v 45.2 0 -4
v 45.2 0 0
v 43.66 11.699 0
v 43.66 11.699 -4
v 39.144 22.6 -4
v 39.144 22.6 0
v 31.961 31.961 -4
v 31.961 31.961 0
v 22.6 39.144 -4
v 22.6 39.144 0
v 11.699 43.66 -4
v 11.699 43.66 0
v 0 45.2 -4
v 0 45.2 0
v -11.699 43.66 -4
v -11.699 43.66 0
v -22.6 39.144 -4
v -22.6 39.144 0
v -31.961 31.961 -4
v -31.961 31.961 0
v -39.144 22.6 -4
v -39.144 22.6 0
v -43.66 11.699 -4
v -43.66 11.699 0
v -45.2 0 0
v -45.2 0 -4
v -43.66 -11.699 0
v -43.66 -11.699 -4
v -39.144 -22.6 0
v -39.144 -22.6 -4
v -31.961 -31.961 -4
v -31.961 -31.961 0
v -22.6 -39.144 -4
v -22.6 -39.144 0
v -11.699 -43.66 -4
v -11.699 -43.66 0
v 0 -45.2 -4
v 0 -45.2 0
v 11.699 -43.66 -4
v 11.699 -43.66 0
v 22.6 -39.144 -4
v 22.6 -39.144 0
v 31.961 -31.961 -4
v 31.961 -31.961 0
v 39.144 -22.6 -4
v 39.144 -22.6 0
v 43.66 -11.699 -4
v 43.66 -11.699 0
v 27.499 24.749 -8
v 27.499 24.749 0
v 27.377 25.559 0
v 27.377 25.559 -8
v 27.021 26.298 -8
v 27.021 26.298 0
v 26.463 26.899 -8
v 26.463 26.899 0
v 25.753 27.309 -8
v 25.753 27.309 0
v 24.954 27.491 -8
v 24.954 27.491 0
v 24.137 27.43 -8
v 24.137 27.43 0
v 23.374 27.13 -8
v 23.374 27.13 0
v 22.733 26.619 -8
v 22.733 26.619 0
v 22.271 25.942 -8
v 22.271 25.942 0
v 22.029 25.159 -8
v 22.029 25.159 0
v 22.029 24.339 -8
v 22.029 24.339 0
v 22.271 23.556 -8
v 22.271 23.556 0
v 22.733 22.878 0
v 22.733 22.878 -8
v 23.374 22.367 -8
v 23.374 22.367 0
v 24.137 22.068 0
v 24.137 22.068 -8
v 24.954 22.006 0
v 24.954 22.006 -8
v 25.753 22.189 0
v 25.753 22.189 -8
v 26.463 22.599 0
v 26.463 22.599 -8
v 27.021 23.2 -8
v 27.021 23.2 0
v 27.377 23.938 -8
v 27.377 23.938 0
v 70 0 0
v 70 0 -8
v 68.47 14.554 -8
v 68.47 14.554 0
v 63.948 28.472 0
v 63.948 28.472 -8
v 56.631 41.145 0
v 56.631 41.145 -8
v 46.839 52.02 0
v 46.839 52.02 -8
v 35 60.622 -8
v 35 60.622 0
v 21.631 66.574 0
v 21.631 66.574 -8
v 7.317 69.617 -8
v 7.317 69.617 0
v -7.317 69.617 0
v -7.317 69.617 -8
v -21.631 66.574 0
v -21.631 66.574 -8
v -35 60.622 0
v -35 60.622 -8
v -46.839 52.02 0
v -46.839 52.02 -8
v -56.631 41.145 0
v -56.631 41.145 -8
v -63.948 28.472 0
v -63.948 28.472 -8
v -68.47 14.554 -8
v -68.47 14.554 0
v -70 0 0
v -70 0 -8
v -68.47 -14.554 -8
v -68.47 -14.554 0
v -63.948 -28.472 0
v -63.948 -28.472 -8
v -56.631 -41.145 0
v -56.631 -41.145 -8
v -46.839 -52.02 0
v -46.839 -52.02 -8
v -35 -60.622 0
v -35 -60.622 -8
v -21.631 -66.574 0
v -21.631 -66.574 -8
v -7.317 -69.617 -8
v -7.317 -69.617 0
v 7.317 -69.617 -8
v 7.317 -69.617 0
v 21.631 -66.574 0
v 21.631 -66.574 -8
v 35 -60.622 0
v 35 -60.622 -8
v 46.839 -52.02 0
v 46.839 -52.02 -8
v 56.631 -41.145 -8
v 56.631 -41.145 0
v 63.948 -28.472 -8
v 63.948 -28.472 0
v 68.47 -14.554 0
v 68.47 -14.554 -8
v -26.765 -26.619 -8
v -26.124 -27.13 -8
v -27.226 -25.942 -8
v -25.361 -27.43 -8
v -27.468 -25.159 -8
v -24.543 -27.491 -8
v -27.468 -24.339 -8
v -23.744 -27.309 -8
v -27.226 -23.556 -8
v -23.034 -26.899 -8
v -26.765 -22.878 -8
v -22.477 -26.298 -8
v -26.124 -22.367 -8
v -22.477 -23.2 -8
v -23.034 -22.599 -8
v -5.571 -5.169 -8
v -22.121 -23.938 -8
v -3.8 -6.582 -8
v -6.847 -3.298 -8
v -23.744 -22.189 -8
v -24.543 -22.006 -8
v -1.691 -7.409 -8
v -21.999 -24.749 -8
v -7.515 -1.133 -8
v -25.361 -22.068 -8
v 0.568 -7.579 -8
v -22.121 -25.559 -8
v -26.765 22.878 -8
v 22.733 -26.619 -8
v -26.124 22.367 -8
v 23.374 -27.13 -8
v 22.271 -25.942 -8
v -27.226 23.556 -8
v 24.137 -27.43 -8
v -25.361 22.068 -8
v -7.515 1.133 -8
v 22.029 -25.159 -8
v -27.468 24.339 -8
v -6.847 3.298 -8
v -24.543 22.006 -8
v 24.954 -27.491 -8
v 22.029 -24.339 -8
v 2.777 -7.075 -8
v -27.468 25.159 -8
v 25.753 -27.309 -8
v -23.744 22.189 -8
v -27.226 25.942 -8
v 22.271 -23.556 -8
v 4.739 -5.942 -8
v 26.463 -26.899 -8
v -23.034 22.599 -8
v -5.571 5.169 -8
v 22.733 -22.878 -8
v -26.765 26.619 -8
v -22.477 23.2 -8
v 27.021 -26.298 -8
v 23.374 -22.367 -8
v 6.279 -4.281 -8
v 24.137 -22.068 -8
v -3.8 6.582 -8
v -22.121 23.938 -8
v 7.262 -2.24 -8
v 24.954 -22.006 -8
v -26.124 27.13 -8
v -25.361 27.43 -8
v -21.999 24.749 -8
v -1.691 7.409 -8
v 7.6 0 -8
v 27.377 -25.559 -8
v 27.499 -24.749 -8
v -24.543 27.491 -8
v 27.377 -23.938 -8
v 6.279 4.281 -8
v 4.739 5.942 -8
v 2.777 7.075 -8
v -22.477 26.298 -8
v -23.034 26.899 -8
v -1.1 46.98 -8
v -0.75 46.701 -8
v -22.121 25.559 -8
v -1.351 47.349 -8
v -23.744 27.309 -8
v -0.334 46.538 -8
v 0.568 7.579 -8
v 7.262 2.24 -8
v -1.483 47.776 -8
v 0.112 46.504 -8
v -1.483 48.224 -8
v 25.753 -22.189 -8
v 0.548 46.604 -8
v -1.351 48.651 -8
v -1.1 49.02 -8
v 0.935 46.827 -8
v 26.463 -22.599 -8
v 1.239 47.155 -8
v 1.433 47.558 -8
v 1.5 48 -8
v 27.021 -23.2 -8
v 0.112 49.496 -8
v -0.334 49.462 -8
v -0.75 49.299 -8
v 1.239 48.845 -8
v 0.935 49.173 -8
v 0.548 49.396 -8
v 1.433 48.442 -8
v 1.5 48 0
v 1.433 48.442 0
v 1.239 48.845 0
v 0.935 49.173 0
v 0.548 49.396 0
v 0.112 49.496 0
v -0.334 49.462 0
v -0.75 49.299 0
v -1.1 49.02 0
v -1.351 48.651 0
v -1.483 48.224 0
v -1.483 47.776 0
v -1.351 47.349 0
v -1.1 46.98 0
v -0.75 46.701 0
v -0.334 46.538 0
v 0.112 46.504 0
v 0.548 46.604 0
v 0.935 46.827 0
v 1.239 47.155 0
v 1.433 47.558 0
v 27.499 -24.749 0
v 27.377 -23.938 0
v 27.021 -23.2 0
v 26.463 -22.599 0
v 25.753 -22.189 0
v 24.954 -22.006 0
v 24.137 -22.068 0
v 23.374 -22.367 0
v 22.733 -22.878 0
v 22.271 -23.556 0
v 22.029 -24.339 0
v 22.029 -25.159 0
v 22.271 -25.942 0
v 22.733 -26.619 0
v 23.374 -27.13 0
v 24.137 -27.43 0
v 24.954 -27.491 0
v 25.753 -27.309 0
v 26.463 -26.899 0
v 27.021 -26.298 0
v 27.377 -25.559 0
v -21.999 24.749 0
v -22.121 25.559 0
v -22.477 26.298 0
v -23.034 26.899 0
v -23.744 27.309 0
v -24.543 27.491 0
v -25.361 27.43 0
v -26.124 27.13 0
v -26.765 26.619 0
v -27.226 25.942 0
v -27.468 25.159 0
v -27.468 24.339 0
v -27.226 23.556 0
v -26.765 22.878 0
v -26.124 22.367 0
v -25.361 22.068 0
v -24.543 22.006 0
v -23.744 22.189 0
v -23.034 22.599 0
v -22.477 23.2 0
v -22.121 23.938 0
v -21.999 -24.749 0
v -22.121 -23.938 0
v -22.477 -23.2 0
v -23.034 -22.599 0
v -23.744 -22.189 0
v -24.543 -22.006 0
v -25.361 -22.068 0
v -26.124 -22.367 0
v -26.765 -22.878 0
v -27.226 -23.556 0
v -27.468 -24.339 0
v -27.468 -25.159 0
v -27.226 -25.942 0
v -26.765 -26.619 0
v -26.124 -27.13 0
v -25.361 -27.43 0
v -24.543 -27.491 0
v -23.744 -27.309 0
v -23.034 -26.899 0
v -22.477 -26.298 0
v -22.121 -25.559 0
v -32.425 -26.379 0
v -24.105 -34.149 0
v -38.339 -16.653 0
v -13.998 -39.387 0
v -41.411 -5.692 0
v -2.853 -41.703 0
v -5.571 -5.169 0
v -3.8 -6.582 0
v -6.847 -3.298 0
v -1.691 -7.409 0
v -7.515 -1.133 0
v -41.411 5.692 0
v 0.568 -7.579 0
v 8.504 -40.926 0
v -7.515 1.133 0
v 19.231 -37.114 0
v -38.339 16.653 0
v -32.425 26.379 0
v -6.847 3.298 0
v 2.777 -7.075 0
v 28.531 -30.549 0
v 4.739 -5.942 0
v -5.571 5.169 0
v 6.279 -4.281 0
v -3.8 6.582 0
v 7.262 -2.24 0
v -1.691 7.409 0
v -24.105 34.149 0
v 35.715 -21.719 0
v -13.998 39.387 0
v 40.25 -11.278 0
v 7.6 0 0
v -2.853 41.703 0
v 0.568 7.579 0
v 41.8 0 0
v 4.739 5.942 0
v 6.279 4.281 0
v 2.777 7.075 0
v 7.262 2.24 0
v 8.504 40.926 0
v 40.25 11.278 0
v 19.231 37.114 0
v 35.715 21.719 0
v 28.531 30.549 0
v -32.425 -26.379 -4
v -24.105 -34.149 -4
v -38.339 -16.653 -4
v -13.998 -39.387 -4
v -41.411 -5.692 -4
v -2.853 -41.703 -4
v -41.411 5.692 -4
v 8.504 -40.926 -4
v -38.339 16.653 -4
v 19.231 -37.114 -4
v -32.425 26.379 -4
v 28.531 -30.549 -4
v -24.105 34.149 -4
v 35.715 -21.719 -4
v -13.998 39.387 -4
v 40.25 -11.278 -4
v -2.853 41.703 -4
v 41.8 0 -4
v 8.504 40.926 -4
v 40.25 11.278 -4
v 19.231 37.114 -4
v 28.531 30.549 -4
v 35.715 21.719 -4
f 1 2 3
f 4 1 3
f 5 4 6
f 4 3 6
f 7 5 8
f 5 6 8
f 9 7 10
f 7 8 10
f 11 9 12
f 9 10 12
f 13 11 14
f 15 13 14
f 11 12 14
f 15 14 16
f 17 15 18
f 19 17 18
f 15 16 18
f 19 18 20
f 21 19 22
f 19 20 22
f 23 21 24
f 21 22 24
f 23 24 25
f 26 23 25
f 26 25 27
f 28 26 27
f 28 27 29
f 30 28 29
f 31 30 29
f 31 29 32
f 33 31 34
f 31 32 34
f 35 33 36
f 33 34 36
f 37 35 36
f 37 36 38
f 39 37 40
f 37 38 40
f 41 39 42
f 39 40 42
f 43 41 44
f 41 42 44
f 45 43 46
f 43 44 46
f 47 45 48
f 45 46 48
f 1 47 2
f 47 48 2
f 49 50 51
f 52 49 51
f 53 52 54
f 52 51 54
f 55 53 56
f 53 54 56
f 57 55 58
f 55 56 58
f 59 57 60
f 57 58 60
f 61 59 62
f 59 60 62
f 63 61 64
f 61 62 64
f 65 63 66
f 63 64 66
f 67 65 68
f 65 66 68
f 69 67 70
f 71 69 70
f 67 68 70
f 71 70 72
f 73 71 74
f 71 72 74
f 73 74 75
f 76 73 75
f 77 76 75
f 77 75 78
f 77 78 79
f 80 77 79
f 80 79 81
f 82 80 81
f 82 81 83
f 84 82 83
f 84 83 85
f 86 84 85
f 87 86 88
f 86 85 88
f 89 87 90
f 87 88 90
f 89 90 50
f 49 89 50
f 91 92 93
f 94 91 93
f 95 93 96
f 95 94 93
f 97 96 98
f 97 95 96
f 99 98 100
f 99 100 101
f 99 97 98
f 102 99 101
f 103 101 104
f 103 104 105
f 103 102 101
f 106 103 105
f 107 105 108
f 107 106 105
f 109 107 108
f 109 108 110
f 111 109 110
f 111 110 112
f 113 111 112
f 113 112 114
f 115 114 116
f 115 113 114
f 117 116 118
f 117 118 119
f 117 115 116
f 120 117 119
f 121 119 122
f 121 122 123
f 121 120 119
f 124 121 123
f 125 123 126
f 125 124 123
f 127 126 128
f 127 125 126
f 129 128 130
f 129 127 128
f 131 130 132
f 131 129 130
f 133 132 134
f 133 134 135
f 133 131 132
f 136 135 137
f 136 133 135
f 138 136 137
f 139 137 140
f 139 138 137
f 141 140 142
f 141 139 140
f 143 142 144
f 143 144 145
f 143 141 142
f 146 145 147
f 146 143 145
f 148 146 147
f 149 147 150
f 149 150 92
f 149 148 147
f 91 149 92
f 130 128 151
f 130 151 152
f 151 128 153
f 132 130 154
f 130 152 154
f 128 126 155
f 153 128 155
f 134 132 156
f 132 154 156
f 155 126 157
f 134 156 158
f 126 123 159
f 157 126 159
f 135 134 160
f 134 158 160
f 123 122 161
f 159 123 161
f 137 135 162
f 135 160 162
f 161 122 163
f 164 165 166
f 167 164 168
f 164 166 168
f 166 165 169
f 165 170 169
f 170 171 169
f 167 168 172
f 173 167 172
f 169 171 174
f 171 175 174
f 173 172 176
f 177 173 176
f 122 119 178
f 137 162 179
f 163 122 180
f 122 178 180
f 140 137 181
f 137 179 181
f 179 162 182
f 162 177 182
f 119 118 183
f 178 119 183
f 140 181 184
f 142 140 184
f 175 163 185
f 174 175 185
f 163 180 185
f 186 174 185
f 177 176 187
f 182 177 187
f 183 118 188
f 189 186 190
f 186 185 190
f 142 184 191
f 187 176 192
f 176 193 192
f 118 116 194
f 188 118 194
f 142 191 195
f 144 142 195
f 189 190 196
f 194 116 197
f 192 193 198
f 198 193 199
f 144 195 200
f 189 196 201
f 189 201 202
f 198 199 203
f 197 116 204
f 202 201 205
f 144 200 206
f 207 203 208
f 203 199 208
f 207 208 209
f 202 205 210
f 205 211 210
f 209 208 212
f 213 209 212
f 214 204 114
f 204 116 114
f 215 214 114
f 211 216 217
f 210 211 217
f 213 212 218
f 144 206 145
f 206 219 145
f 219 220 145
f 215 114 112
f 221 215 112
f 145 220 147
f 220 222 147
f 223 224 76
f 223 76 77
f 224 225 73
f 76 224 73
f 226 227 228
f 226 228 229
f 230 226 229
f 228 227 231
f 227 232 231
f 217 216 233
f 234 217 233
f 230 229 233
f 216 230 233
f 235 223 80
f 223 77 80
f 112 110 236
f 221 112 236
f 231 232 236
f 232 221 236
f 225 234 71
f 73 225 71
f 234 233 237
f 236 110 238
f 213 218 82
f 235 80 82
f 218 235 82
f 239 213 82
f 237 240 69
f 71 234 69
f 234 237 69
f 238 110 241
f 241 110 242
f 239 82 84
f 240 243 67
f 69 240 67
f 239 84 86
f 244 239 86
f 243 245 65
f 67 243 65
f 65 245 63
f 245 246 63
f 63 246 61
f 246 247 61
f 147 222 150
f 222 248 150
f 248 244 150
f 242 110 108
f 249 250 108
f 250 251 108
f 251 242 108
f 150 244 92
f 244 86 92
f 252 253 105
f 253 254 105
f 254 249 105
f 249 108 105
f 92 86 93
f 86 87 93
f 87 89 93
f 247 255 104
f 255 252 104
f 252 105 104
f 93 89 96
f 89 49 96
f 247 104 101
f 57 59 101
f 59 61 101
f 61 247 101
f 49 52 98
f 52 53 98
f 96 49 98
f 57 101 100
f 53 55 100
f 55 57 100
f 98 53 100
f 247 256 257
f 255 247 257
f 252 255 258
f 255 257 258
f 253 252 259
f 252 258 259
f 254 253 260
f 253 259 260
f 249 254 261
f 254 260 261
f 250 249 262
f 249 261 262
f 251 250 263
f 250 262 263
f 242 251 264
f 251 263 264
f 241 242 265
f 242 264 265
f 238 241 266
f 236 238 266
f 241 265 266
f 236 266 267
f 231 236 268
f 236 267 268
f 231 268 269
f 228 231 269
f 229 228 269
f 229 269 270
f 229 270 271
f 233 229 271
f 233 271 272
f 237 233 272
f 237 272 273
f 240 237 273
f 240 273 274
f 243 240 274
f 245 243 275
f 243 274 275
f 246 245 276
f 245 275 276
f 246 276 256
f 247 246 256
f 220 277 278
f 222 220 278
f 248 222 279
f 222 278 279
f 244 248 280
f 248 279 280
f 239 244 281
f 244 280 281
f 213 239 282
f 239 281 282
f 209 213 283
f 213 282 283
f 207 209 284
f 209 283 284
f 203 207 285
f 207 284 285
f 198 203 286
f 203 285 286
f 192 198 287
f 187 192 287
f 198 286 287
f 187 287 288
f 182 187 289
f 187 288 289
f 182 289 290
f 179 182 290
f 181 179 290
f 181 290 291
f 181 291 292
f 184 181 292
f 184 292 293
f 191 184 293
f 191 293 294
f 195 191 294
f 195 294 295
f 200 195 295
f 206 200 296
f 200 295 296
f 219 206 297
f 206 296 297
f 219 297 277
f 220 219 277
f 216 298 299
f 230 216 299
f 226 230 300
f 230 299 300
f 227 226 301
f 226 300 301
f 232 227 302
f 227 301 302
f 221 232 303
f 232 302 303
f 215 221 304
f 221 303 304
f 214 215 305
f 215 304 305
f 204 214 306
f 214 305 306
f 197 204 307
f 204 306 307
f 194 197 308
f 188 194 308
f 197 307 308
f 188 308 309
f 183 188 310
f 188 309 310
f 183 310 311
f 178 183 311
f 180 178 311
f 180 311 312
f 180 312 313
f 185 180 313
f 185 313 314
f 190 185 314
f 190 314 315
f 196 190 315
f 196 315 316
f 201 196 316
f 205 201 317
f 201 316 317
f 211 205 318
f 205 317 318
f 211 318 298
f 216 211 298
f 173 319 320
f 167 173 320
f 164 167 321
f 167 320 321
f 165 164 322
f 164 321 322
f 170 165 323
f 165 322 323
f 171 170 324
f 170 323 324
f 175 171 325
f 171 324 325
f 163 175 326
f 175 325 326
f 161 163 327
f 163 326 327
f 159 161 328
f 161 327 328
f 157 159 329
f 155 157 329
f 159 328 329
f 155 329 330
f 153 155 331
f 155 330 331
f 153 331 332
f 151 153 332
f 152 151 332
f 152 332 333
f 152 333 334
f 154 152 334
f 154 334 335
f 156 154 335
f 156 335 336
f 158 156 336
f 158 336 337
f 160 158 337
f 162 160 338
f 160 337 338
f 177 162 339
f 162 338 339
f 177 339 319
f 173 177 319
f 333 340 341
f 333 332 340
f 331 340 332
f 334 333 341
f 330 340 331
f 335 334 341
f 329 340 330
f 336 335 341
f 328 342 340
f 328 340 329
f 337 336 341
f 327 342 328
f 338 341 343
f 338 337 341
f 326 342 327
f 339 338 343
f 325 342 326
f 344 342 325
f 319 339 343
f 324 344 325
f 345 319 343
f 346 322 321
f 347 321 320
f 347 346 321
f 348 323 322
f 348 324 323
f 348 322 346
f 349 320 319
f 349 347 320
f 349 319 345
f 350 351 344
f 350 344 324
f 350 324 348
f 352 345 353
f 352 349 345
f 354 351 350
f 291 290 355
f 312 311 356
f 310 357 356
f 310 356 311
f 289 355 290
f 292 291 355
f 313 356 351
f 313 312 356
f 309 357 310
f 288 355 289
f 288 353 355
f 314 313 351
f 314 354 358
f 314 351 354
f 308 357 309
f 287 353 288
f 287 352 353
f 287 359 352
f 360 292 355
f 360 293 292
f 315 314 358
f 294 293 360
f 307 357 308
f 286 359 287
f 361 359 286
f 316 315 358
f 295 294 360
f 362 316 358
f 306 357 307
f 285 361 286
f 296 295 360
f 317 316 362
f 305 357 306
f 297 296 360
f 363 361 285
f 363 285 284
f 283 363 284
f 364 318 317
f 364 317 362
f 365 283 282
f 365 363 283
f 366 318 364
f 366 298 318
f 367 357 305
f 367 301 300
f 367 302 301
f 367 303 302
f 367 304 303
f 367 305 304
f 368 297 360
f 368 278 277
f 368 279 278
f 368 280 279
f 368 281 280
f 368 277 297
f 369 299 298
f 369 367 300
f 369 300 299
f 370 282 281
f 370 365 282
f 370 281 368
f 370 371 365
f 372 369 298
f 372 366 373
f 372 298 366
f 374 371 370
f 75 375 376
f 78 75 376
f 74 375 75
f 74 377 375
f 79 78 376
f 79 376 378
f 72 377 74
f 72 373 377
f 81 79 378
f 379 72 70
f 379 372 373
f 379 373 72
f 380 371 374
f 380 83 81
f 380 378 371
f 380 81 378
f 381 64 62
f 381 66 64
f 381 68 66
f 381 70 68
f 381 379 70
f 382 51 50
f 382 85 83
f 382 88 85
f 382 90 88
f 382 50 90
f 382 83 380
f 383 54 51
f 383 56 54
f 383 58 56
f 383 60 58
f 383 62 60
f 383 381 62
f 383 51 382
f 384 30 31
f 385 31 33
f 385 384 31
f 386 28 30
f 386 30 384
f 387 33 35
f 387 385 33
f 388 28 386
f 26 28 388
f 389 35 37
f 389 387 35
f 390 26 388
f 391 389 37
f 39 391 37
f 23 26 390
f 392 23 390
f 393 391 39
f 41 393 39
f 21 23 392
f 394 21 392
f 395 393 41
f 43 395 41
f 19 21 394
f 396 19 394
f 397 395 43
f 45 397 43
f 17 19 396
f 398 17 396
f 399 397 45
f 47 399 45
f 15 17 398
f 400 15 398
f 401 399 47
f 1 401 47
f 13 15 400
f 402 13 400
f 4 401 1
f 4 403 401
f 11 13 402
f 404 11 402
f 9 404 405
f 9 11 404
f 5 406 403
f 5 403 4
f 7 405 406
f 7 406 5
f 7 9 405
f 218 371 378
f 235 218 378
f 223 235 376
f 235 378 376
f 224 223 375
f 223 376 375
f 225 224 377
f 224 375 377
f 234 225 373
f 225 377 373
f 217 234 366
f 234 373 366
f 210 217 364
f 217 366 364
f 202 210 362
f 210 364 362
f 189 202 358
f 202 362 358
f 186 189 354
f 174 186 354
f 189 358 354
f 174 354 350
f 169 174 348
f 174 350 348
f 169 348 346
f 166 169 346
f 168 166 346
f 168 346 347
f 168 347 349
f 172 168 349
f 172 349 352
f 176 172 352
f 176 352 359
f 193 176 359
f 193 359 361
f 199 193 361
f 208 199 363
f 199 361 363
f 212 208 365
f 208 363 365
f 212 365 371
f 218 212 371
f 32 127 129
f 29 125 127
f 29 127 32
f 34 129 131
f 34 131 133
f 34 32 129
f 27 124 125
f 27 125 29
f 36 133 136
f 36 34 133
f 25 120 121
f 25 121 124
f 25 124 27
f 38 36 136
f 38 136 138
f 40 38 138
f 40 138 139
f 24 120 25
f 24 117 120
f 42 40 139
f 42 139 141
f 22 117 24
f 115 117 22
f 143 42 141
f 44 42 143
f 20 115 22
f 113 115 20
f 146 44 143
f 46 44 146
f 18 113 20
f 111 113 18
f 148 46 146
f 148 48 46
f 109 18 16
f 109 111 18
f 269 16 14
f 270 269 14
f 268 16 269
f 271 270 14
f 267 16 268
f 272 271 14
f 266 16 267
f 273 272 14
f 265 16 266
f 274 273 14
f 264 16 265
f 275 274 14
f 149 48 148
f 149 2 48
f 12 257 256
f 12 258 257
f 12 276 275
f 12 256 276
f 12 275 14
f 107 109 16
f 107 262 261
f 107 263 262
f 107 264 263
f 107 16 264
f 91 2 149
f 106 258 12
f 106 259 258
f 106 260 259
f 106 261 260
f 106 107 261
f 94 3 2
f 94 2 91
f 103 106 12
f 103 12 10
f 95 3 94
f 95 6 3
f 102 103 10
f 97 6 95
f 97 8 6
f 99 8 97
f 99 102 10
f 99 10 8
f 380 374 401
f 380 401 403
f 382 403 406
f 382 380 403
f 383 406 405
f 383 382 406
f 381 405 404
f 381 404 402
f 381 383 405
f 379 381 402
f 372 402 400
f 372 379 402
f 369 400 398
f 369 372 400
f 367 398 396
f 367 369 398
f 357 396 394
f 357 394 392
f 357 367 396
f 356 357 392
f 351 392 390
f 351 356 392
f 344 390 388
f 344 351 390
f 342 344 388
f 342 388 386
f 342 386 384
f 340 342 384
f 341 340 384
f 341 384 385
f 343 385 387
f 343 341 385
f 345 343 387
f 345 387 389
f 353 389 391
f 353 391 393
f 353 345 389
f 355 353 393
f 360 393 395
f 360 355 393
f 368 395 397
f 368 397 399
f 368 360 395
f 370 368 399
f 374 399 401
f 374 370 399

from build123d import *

# Parameters (mm, degrees)
SKETCH_1_R          = 70
SKETCH_1_R_2        = 7.6
SKETCH_1_R_3        = 2.75
SKETCH_1_R_4        = 1.5
EXTRUDE_1_DEPTH     = 8
SKETCH_2_R          = 45.2
SKETCH_2_R_2        = 41.8
CUT_EXTRUDE_2_DEPTH = 4


with BuildPart() as part:
    # 草图1 → 凸台-拉伸1 (new body)
    with BuildSketch(Plane.XY):
        Circle(SKETCH_1_R)
        Circle(SKETCH_1_R_2, mode=Mode.SUBTRACT)
        with Locations((24.748737342, 24.748737342)):
            Circle(SKETCH_1_R_3, mode=Mode.SUBTRACT)
        with Locations((-24.748737342, 24.748737342)):
            Circle(SKETCH_1_R_3, mode=Mode.SUBTRACT)
        with Locations((-24.748737342, -24.748737342)):
            Circle(SKETCH_1_R_3, mode=Mode.SUBTRACT)
        with Locations((24.748737342, -24.748737342)):
            Circle(SKETCH_1_R_3, mode=Mode.SUBTRACT)
        with Locations((0, 48)):
            Circle(SKETCH_1_R_4, mode=Mode.SUBTRACT)
    extrude(amount=-EXTRUDE_1_DEPTH)

    # 草图2 → 切除-拉伸2 (cut)
    with BuildSketch(Plane.XY):
        Circle(SKETCH_2_R)
        Circle(SKETCH_2_R_2, mode=Mode.SUBTRACT)
    extrude(amount=-CUT_EXTRUDE_2_DEPTH, mode=Mode.SUBTRACT)


solid = part.part
